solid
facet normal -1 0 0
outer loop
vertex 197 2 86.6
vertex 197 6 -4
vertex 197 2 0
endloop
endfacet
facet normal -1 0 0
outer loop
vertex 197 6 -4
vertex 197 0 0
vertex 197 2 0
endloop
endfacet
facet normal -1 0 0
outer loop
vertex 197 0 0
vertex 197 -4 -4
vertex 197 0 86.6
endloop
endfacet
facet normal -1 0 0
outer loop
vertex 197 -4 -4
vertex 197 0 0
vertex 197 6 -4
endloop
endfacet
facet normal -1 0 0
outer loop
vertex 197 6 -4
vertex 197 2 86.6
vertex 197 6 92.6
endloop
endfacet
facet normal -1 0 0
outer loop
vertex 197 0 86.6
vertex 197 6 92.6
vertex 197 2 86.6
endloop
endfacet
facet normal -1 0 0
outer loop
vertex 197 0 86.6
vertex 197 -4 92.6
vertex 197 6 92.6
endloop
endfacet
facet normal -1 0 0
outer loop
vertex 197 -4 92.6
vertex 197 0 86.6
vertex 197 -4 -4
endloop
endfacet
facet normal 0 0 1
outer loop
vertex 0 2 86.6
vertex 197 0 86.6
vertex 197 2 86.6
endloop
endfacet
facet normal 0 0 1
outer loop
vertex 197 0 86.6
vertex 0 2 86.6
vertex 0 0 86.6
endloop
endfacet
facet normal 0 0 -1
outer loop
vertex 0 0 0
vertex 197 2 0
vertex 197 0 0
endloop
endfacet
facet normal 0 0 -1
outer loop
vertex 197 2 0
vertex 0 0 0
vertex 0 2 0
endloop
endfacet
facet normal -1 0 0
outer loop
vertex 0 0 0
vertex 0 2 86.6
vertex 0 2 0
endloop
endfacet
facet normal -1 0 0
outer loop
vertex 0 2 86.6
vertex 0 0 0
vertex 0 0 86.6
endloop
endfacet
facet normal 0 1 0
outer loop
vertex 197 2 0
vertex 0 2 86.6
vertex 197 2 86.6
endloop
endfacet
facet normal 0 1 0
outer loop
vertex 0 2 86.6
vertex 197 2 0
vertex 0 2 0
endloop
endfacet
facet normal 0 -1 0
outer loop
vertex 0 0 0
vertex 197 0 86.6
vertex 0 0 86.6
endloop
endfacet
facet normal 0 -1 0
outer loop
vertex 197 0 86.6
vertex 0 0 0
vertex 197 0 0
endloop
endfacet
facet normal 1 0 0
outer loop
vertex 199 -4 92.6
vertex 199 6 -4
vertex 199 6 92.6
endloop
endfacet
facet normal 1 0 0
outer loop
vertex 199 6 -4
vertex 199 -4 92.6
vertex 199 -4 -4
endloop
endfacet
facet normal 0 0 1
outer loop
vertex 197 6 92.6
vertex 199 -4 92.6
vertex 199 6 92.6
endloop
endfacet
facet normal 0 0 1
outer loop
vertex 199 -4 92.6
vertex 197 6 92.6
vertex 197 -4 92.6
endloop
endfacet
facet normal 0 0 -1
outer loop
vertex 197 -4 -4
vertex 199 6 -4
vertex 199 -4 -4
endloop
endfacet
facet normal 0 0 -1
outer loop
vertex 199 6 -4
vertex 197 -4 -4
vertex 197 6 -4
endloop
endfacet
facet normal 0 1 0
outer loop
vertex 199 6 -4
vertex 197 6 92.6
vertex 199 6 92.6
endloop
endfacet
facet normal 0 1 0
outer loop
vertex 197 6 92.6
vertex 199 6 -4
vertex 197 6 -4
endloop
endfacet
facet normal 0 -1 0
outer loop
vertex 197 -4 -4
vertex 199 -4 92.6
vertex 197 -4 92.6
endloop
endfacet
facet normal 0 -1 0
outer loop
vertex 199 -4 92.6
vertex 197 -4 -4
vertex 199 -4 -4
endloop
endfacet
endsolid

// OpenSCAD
cube([197, 2, 86.6]);
translate([197, -4, -4])
cube([2, 10, 96.6]);
